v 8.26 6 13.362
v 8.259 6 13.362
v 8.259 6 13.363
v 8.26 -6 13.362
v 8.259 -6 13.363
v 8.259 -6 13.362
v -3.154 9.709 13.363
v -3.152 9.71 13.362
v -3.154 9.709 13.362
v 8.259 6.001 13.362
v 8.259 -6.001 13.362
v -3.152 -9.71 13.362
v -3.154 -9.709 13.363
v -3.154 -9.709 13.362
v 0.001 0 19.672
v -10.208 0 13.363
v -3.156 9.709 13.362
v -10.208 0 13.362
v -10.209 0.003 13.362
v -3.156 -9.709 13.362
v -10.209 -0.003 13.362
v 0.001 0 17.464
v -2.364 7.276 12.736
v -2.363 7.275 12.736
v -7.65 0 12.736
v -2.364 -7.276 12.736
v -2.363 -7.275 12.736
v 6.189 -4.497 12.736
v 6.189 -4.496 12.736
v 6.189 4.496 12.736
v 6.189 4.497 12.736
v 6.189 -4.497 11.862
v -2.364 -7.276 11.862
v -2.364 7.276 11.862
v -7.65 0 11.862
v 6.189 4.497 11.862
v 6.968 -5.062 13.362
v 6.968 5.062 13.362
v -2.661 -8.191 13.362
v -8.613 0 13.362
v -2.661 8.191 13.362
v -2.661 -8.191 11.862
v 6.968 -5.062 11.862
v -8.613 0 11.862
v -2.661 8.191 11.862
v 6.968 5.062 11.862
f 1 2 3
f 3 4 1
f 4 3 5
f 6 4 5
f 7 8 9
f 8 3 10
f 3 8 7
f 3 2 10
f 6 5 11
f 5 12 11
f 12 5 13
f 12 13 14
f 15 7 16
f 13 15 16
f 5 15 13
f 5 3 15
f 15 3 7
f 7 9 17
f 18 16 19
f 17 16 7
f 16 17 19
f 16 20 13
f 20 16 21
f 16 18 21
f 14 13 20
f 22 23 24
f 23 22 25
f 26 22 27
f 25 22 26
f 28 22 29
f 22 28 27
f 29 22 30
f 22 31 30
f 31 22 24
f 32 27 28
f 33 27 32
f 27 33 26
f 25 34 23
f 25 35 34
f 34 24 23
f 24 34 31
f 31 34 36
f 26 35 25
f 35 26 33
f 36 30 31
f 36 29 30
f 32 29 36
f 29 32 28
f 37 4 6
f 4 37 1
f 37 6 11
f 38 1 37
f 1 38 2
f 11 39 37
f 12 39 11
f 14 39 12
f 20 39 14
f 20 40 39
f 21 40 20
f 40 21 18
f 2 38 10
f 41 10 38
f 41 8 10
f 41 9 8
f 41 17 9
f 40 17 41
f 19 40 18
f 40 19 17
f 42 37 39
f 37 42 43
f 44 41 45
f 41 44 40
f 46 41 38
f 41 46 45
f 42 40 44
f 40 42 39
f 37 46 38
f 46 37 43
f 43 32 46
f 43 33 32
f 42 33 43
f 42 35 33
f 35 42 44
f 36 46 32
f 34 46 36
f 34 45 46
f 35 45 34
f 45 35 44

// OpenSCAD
arete = 12;
creux = 1; // creux ou plein || 1 ou 0
paroi = 1.5;
echelleReductionAjustementBouchon = 0.965;
bouchon = 1; // 1 ou 0
corps = 0; // 1 ou 0

// Controle rotation viewport quand animation en route
//$vpr = [70, 0, $t * 180];

/* Forme
Choix parmi:
- 0 => Etoilé
- 1 => Christique
- 2 => Christique_inversé
- 3 => Pentakis // (all points on sphere)
- 4 => Animate // voir plus bas pour plus d'infos
*/
forme_ID = 1;

/////////

function dodeca_ext_radius(a) = 
    a/2*(sqrt(2));
    
function dodeca_sphere_inscrite_radius(a) = 
    a*sqrt(5/8+11/(8*sqrt(5)));
    
function dodeca_arete_from_sphere_inscrite(radius) = 
    radius/sqrt(5/8+11/(8*sqrt(5)));    

spike = [
    2.3417, // Etoilé, scale 1 is arete = 1.236 mm, diametre = 6.24 mm, arete pyramide = 2 mm
    0.8944, // Christique, scale 1 is arete = 1.236 mm, diametre = 4.05 mm
    -0.8944, // Christique inversé
    0.4279 // Pentakis
];

if (forme_ID == 4) {
    Animate();
} else {  
    if (creux == 0) {
        small_stellated_dodecahedron(spike[forme_ID], small_stellated_dodecahedron);
    } else {
        if (corps == 1) {
            corps_ouvert();
        }
        if (bouchon == 1) {
            bouchon();
        }
    }
}


//		poly_creux();
//		decoupe_bouchon();

module corps_ouvert() {
    rotate([180, 0, 0])
	difference() {
		poly_creux();
		decoupe_bouchon();
	}
}

module poly_creux() {
    areteInt = dodeca_arete_from_sphere_inscrite(dodeca_sphere_inscrite_radius(arete)-paroi);
                         
    echo("arete int: ", areteInt);
    
    difference() {
        small_stellated_dodecahedron(spike[forme_ID], arete);
        small_stellated_dodecahedron(spike[forme_ID], areteInt);
    }
}

module decoupe_bouchon(scale=1) {
    distance = dodeca_sphere_inscrite_radius(arete);
	rotate([0,0,36]) translate([0,0, distance])
		cylinder(99, r=arete*0.853, $fn=5, center=false);
	rotate([0,0,36]) translate([0,0, distance-paroi])
		cylinder(paroi, r=(arete-paroi)*0.85*scale, $fn=5, center=false);
}

module supplement_feuillure_bouchon() {
    distance = dodeca_sphere_inscrite_radius(arete);
    rotate([0,0,36]) translate([0,0, distance-paroi-1])
    difference() {   
		cylinder(paroi+1, r=(arete-paroi)*0.85, $fn=5, center=false);
		cylinder(paroi+1, r=(arete-2*paroi)*0.85, $fn=5, center=false);
    }
}

module bouchon() {
//	scale([echelleReductionAjustementBouchon, echelleReductionAjustementBouchon, 0.995])
	difference () {
        intersection() {
            union() {
                poly_creux();
                supplement_feuillure_bouchon();
            }
            decoupe_bouchon(echelleReductionAjustementBouchon);
        }
	}
}

// }}

/*
animates the single parameter of the
module small_stellated_dodecahedron

1/ choose animate in the view menu
2/ sets fps to an appropiate number for
your machine - 20 is good
3/ set steps to a number that keeps the
change from happening too slowly or
too fast - 200 is good
*/
module Animate() {
    small_stellated_dodecahedron(-3.4317*abs(2*$t-1)+2.4317);
}

// Étoilé
// scale 1 is arete = 1.236 mm, diametre = 6.24 mm, arete pyramide = 2 mm
module Etoile(a) {
    small_stellated_dodecahedron(2.3417, a);
}

// Christique
// scale 1 is arete = 1.236 mm, diametre = 4.05 mm
module Christique(a) {
    small_stellated_dodecahedron(0.8944, a);
}

// Christique inversé
module Christique_inv(a) {
    small_stellated_dodecahedron(-0.8944, a);
}

// Pentakis (all points on sphere)
module Pentakis(a) {
    small_stellated_dodecahedron(0.4279, a);
}

module small_stellated_dodecahedron(scale, ar)
{
a=scale*0.61803;
b=scale*0.38197;
    
length = ar ? ar : arete;
echo("length:", length);
// scale(1) => arete 1.236 mm
scale(length/1.236)

// Posé sur 3 pointes
//rotate([20.91, 0, 0])

// Posé sur 1 pointe
rotate([0, 31.72, 0])

/*
constructed from 12 pentagonal pyramids placed
on the faces of a dodecahedron.
first 20 points are the vertices of a dodecahedron
next 12 points are the vertices of the centers
of the faces of the dodecahedron

if scale = 0 a dodecahedron is created

if scale is positive the centers of the
faces are moved out fron the center of the
dodecahedron

if scale is negative the centers of the
faces are moved in towards the center of the
dodecahedron

the apex angles of the triangles that make up
the faces of the stellated dodecahedron
are 36 degrees - the scale factor that
makes a small stellated dodecahedron
is approximately 2.3417
length of side of pentagonal pyramid for
small stellated dodecahedron = 2

the apex angles of the triangles that make up
the faces of a pentakis dodecahedron ( one of
the Catalan solids) are about 68.619 degrees
the scale factor to make one is ca 0.4279

if len = length of the sides of the
pentagonal pyramid then approximately

scale = + or - sqrt((len*len/0.52786) - 2.09443)

lengths of the sides of the base are sqrt(5)-1
or 1.23607 to make equilateral triangles scale
factor is 0.8944

distance from centers of faces to origin ca 1.37638
distance from dodecahedral points to origin sqrt(3)




pcm

*/

polyhedron
       (points = [
                 [   1.00000,   1.00000,   1.00000],
                 [   1.00000,   1.00000,  -1.00000],
                 [   1.00000,  -1.00000,   1.00000],
                 [   1.00000,  -1.00000,  -1.00000],
                 [  -1.00000,   1.00000,   1.00000],
                 [  -1.00000,   1.00000,  -1.00000],
                 [  -1.00000,  -1.00000,   1.00000],
                 [  -1.00000,  -1.00000,  -1.00000],
                 [   0.00000,   0.61803,   1.61803],
                 [   0.00000,   0.61803,  -1.61803],
                 [   0.00000,  -0.61803,   1.61803],
                 [   0.00000,  -0.61803,  -1.61803],
                 [   0.61803,   1.61803,   0.00000],
                 [   0.61803,  -1.61803,   0.00000],
                 [  -0.61803,   1.61803,   0.00000],
                 [  -0.61803,  -1.61803,   0.00000],
                 [   1.61803,   0.00000,   0.61803],
                 [   1.61803,   0.00000,  -0.61803],
                 [  -1.61803,   0.00000,   0.61803],
                 [  -1.61803,   0.00000,  -0.61803],
                 [   1.17082+a,   0.72361+b,   0.00000],
                 [   0.72361+b,   0.00000,   1.17082+a],
                 [   0.00000,   1.17082+a,   0.72361+b],
                 [   0.00000,   1.17082+a,  -0.72361-b],
                 [   0.72361+b,   0.00000,  -1.17082-a],
                 [   1.17082+a,  -0.72361-b,   0.00000],
                 [   0.00000,  -1.17082-a,   0.72361+b],
                 [   0.00000,  -1.17082-a,  -0.72361-b],
                 [  -0.72361-b,   0.00000,   1.17082+a],
                 [  -1.17082-a,   0.72361+b,   0.00000],
                 [  -0.72361-b,   0.00000,  -1.17082-a],
                 [  -1.17082-a,  -0.72361-b,   0.00000],
                   ],

           faces = [

                [0,20,16],[16,20,17],[17,20,1],
                [1,20,12],[12,20,0],
                [0,21,8],[8,21,10],[10,21,2],
                [2,21,16],[16,21,0],
                 [0,22,12],[12,22,14],[14,22,4],
                [4,22,8],[8,22,0],
                [1,23,9],[9,23,5],[5,23,14],
                [14,23,12],[12,23,1],
                [1,24,17],[17,24,3],[3,24,11],
                [11,24,9],[9,24,1],
                [16,25,2],[17,25,16],[3,25,17],
                 [13,25,3],[2,25,13],
                 [2,26,10],[10,26,6],[6,26,15],
                 [15,26,13],[13,26,2],
                 [3,27,13],[13,27,15],[15,27,7],
                 [7,27,11],[11,27,3],
                [4,28,18],[18,28,6],[6,28,10],
                 [10,28,8],[8,28,4],
                 [4,29,14],[14,29,5],[5,29,19],
                 [19,29,18],[18,29,4],
                  [5,30,9],[9,30,11],[11,30,7],
                 [7,30,19],[19,30,5],
                 [6,31,18],[18,31,19],[19,31,7],
                 [7,31,15],[15,31,6],

                 ]
      );
}
